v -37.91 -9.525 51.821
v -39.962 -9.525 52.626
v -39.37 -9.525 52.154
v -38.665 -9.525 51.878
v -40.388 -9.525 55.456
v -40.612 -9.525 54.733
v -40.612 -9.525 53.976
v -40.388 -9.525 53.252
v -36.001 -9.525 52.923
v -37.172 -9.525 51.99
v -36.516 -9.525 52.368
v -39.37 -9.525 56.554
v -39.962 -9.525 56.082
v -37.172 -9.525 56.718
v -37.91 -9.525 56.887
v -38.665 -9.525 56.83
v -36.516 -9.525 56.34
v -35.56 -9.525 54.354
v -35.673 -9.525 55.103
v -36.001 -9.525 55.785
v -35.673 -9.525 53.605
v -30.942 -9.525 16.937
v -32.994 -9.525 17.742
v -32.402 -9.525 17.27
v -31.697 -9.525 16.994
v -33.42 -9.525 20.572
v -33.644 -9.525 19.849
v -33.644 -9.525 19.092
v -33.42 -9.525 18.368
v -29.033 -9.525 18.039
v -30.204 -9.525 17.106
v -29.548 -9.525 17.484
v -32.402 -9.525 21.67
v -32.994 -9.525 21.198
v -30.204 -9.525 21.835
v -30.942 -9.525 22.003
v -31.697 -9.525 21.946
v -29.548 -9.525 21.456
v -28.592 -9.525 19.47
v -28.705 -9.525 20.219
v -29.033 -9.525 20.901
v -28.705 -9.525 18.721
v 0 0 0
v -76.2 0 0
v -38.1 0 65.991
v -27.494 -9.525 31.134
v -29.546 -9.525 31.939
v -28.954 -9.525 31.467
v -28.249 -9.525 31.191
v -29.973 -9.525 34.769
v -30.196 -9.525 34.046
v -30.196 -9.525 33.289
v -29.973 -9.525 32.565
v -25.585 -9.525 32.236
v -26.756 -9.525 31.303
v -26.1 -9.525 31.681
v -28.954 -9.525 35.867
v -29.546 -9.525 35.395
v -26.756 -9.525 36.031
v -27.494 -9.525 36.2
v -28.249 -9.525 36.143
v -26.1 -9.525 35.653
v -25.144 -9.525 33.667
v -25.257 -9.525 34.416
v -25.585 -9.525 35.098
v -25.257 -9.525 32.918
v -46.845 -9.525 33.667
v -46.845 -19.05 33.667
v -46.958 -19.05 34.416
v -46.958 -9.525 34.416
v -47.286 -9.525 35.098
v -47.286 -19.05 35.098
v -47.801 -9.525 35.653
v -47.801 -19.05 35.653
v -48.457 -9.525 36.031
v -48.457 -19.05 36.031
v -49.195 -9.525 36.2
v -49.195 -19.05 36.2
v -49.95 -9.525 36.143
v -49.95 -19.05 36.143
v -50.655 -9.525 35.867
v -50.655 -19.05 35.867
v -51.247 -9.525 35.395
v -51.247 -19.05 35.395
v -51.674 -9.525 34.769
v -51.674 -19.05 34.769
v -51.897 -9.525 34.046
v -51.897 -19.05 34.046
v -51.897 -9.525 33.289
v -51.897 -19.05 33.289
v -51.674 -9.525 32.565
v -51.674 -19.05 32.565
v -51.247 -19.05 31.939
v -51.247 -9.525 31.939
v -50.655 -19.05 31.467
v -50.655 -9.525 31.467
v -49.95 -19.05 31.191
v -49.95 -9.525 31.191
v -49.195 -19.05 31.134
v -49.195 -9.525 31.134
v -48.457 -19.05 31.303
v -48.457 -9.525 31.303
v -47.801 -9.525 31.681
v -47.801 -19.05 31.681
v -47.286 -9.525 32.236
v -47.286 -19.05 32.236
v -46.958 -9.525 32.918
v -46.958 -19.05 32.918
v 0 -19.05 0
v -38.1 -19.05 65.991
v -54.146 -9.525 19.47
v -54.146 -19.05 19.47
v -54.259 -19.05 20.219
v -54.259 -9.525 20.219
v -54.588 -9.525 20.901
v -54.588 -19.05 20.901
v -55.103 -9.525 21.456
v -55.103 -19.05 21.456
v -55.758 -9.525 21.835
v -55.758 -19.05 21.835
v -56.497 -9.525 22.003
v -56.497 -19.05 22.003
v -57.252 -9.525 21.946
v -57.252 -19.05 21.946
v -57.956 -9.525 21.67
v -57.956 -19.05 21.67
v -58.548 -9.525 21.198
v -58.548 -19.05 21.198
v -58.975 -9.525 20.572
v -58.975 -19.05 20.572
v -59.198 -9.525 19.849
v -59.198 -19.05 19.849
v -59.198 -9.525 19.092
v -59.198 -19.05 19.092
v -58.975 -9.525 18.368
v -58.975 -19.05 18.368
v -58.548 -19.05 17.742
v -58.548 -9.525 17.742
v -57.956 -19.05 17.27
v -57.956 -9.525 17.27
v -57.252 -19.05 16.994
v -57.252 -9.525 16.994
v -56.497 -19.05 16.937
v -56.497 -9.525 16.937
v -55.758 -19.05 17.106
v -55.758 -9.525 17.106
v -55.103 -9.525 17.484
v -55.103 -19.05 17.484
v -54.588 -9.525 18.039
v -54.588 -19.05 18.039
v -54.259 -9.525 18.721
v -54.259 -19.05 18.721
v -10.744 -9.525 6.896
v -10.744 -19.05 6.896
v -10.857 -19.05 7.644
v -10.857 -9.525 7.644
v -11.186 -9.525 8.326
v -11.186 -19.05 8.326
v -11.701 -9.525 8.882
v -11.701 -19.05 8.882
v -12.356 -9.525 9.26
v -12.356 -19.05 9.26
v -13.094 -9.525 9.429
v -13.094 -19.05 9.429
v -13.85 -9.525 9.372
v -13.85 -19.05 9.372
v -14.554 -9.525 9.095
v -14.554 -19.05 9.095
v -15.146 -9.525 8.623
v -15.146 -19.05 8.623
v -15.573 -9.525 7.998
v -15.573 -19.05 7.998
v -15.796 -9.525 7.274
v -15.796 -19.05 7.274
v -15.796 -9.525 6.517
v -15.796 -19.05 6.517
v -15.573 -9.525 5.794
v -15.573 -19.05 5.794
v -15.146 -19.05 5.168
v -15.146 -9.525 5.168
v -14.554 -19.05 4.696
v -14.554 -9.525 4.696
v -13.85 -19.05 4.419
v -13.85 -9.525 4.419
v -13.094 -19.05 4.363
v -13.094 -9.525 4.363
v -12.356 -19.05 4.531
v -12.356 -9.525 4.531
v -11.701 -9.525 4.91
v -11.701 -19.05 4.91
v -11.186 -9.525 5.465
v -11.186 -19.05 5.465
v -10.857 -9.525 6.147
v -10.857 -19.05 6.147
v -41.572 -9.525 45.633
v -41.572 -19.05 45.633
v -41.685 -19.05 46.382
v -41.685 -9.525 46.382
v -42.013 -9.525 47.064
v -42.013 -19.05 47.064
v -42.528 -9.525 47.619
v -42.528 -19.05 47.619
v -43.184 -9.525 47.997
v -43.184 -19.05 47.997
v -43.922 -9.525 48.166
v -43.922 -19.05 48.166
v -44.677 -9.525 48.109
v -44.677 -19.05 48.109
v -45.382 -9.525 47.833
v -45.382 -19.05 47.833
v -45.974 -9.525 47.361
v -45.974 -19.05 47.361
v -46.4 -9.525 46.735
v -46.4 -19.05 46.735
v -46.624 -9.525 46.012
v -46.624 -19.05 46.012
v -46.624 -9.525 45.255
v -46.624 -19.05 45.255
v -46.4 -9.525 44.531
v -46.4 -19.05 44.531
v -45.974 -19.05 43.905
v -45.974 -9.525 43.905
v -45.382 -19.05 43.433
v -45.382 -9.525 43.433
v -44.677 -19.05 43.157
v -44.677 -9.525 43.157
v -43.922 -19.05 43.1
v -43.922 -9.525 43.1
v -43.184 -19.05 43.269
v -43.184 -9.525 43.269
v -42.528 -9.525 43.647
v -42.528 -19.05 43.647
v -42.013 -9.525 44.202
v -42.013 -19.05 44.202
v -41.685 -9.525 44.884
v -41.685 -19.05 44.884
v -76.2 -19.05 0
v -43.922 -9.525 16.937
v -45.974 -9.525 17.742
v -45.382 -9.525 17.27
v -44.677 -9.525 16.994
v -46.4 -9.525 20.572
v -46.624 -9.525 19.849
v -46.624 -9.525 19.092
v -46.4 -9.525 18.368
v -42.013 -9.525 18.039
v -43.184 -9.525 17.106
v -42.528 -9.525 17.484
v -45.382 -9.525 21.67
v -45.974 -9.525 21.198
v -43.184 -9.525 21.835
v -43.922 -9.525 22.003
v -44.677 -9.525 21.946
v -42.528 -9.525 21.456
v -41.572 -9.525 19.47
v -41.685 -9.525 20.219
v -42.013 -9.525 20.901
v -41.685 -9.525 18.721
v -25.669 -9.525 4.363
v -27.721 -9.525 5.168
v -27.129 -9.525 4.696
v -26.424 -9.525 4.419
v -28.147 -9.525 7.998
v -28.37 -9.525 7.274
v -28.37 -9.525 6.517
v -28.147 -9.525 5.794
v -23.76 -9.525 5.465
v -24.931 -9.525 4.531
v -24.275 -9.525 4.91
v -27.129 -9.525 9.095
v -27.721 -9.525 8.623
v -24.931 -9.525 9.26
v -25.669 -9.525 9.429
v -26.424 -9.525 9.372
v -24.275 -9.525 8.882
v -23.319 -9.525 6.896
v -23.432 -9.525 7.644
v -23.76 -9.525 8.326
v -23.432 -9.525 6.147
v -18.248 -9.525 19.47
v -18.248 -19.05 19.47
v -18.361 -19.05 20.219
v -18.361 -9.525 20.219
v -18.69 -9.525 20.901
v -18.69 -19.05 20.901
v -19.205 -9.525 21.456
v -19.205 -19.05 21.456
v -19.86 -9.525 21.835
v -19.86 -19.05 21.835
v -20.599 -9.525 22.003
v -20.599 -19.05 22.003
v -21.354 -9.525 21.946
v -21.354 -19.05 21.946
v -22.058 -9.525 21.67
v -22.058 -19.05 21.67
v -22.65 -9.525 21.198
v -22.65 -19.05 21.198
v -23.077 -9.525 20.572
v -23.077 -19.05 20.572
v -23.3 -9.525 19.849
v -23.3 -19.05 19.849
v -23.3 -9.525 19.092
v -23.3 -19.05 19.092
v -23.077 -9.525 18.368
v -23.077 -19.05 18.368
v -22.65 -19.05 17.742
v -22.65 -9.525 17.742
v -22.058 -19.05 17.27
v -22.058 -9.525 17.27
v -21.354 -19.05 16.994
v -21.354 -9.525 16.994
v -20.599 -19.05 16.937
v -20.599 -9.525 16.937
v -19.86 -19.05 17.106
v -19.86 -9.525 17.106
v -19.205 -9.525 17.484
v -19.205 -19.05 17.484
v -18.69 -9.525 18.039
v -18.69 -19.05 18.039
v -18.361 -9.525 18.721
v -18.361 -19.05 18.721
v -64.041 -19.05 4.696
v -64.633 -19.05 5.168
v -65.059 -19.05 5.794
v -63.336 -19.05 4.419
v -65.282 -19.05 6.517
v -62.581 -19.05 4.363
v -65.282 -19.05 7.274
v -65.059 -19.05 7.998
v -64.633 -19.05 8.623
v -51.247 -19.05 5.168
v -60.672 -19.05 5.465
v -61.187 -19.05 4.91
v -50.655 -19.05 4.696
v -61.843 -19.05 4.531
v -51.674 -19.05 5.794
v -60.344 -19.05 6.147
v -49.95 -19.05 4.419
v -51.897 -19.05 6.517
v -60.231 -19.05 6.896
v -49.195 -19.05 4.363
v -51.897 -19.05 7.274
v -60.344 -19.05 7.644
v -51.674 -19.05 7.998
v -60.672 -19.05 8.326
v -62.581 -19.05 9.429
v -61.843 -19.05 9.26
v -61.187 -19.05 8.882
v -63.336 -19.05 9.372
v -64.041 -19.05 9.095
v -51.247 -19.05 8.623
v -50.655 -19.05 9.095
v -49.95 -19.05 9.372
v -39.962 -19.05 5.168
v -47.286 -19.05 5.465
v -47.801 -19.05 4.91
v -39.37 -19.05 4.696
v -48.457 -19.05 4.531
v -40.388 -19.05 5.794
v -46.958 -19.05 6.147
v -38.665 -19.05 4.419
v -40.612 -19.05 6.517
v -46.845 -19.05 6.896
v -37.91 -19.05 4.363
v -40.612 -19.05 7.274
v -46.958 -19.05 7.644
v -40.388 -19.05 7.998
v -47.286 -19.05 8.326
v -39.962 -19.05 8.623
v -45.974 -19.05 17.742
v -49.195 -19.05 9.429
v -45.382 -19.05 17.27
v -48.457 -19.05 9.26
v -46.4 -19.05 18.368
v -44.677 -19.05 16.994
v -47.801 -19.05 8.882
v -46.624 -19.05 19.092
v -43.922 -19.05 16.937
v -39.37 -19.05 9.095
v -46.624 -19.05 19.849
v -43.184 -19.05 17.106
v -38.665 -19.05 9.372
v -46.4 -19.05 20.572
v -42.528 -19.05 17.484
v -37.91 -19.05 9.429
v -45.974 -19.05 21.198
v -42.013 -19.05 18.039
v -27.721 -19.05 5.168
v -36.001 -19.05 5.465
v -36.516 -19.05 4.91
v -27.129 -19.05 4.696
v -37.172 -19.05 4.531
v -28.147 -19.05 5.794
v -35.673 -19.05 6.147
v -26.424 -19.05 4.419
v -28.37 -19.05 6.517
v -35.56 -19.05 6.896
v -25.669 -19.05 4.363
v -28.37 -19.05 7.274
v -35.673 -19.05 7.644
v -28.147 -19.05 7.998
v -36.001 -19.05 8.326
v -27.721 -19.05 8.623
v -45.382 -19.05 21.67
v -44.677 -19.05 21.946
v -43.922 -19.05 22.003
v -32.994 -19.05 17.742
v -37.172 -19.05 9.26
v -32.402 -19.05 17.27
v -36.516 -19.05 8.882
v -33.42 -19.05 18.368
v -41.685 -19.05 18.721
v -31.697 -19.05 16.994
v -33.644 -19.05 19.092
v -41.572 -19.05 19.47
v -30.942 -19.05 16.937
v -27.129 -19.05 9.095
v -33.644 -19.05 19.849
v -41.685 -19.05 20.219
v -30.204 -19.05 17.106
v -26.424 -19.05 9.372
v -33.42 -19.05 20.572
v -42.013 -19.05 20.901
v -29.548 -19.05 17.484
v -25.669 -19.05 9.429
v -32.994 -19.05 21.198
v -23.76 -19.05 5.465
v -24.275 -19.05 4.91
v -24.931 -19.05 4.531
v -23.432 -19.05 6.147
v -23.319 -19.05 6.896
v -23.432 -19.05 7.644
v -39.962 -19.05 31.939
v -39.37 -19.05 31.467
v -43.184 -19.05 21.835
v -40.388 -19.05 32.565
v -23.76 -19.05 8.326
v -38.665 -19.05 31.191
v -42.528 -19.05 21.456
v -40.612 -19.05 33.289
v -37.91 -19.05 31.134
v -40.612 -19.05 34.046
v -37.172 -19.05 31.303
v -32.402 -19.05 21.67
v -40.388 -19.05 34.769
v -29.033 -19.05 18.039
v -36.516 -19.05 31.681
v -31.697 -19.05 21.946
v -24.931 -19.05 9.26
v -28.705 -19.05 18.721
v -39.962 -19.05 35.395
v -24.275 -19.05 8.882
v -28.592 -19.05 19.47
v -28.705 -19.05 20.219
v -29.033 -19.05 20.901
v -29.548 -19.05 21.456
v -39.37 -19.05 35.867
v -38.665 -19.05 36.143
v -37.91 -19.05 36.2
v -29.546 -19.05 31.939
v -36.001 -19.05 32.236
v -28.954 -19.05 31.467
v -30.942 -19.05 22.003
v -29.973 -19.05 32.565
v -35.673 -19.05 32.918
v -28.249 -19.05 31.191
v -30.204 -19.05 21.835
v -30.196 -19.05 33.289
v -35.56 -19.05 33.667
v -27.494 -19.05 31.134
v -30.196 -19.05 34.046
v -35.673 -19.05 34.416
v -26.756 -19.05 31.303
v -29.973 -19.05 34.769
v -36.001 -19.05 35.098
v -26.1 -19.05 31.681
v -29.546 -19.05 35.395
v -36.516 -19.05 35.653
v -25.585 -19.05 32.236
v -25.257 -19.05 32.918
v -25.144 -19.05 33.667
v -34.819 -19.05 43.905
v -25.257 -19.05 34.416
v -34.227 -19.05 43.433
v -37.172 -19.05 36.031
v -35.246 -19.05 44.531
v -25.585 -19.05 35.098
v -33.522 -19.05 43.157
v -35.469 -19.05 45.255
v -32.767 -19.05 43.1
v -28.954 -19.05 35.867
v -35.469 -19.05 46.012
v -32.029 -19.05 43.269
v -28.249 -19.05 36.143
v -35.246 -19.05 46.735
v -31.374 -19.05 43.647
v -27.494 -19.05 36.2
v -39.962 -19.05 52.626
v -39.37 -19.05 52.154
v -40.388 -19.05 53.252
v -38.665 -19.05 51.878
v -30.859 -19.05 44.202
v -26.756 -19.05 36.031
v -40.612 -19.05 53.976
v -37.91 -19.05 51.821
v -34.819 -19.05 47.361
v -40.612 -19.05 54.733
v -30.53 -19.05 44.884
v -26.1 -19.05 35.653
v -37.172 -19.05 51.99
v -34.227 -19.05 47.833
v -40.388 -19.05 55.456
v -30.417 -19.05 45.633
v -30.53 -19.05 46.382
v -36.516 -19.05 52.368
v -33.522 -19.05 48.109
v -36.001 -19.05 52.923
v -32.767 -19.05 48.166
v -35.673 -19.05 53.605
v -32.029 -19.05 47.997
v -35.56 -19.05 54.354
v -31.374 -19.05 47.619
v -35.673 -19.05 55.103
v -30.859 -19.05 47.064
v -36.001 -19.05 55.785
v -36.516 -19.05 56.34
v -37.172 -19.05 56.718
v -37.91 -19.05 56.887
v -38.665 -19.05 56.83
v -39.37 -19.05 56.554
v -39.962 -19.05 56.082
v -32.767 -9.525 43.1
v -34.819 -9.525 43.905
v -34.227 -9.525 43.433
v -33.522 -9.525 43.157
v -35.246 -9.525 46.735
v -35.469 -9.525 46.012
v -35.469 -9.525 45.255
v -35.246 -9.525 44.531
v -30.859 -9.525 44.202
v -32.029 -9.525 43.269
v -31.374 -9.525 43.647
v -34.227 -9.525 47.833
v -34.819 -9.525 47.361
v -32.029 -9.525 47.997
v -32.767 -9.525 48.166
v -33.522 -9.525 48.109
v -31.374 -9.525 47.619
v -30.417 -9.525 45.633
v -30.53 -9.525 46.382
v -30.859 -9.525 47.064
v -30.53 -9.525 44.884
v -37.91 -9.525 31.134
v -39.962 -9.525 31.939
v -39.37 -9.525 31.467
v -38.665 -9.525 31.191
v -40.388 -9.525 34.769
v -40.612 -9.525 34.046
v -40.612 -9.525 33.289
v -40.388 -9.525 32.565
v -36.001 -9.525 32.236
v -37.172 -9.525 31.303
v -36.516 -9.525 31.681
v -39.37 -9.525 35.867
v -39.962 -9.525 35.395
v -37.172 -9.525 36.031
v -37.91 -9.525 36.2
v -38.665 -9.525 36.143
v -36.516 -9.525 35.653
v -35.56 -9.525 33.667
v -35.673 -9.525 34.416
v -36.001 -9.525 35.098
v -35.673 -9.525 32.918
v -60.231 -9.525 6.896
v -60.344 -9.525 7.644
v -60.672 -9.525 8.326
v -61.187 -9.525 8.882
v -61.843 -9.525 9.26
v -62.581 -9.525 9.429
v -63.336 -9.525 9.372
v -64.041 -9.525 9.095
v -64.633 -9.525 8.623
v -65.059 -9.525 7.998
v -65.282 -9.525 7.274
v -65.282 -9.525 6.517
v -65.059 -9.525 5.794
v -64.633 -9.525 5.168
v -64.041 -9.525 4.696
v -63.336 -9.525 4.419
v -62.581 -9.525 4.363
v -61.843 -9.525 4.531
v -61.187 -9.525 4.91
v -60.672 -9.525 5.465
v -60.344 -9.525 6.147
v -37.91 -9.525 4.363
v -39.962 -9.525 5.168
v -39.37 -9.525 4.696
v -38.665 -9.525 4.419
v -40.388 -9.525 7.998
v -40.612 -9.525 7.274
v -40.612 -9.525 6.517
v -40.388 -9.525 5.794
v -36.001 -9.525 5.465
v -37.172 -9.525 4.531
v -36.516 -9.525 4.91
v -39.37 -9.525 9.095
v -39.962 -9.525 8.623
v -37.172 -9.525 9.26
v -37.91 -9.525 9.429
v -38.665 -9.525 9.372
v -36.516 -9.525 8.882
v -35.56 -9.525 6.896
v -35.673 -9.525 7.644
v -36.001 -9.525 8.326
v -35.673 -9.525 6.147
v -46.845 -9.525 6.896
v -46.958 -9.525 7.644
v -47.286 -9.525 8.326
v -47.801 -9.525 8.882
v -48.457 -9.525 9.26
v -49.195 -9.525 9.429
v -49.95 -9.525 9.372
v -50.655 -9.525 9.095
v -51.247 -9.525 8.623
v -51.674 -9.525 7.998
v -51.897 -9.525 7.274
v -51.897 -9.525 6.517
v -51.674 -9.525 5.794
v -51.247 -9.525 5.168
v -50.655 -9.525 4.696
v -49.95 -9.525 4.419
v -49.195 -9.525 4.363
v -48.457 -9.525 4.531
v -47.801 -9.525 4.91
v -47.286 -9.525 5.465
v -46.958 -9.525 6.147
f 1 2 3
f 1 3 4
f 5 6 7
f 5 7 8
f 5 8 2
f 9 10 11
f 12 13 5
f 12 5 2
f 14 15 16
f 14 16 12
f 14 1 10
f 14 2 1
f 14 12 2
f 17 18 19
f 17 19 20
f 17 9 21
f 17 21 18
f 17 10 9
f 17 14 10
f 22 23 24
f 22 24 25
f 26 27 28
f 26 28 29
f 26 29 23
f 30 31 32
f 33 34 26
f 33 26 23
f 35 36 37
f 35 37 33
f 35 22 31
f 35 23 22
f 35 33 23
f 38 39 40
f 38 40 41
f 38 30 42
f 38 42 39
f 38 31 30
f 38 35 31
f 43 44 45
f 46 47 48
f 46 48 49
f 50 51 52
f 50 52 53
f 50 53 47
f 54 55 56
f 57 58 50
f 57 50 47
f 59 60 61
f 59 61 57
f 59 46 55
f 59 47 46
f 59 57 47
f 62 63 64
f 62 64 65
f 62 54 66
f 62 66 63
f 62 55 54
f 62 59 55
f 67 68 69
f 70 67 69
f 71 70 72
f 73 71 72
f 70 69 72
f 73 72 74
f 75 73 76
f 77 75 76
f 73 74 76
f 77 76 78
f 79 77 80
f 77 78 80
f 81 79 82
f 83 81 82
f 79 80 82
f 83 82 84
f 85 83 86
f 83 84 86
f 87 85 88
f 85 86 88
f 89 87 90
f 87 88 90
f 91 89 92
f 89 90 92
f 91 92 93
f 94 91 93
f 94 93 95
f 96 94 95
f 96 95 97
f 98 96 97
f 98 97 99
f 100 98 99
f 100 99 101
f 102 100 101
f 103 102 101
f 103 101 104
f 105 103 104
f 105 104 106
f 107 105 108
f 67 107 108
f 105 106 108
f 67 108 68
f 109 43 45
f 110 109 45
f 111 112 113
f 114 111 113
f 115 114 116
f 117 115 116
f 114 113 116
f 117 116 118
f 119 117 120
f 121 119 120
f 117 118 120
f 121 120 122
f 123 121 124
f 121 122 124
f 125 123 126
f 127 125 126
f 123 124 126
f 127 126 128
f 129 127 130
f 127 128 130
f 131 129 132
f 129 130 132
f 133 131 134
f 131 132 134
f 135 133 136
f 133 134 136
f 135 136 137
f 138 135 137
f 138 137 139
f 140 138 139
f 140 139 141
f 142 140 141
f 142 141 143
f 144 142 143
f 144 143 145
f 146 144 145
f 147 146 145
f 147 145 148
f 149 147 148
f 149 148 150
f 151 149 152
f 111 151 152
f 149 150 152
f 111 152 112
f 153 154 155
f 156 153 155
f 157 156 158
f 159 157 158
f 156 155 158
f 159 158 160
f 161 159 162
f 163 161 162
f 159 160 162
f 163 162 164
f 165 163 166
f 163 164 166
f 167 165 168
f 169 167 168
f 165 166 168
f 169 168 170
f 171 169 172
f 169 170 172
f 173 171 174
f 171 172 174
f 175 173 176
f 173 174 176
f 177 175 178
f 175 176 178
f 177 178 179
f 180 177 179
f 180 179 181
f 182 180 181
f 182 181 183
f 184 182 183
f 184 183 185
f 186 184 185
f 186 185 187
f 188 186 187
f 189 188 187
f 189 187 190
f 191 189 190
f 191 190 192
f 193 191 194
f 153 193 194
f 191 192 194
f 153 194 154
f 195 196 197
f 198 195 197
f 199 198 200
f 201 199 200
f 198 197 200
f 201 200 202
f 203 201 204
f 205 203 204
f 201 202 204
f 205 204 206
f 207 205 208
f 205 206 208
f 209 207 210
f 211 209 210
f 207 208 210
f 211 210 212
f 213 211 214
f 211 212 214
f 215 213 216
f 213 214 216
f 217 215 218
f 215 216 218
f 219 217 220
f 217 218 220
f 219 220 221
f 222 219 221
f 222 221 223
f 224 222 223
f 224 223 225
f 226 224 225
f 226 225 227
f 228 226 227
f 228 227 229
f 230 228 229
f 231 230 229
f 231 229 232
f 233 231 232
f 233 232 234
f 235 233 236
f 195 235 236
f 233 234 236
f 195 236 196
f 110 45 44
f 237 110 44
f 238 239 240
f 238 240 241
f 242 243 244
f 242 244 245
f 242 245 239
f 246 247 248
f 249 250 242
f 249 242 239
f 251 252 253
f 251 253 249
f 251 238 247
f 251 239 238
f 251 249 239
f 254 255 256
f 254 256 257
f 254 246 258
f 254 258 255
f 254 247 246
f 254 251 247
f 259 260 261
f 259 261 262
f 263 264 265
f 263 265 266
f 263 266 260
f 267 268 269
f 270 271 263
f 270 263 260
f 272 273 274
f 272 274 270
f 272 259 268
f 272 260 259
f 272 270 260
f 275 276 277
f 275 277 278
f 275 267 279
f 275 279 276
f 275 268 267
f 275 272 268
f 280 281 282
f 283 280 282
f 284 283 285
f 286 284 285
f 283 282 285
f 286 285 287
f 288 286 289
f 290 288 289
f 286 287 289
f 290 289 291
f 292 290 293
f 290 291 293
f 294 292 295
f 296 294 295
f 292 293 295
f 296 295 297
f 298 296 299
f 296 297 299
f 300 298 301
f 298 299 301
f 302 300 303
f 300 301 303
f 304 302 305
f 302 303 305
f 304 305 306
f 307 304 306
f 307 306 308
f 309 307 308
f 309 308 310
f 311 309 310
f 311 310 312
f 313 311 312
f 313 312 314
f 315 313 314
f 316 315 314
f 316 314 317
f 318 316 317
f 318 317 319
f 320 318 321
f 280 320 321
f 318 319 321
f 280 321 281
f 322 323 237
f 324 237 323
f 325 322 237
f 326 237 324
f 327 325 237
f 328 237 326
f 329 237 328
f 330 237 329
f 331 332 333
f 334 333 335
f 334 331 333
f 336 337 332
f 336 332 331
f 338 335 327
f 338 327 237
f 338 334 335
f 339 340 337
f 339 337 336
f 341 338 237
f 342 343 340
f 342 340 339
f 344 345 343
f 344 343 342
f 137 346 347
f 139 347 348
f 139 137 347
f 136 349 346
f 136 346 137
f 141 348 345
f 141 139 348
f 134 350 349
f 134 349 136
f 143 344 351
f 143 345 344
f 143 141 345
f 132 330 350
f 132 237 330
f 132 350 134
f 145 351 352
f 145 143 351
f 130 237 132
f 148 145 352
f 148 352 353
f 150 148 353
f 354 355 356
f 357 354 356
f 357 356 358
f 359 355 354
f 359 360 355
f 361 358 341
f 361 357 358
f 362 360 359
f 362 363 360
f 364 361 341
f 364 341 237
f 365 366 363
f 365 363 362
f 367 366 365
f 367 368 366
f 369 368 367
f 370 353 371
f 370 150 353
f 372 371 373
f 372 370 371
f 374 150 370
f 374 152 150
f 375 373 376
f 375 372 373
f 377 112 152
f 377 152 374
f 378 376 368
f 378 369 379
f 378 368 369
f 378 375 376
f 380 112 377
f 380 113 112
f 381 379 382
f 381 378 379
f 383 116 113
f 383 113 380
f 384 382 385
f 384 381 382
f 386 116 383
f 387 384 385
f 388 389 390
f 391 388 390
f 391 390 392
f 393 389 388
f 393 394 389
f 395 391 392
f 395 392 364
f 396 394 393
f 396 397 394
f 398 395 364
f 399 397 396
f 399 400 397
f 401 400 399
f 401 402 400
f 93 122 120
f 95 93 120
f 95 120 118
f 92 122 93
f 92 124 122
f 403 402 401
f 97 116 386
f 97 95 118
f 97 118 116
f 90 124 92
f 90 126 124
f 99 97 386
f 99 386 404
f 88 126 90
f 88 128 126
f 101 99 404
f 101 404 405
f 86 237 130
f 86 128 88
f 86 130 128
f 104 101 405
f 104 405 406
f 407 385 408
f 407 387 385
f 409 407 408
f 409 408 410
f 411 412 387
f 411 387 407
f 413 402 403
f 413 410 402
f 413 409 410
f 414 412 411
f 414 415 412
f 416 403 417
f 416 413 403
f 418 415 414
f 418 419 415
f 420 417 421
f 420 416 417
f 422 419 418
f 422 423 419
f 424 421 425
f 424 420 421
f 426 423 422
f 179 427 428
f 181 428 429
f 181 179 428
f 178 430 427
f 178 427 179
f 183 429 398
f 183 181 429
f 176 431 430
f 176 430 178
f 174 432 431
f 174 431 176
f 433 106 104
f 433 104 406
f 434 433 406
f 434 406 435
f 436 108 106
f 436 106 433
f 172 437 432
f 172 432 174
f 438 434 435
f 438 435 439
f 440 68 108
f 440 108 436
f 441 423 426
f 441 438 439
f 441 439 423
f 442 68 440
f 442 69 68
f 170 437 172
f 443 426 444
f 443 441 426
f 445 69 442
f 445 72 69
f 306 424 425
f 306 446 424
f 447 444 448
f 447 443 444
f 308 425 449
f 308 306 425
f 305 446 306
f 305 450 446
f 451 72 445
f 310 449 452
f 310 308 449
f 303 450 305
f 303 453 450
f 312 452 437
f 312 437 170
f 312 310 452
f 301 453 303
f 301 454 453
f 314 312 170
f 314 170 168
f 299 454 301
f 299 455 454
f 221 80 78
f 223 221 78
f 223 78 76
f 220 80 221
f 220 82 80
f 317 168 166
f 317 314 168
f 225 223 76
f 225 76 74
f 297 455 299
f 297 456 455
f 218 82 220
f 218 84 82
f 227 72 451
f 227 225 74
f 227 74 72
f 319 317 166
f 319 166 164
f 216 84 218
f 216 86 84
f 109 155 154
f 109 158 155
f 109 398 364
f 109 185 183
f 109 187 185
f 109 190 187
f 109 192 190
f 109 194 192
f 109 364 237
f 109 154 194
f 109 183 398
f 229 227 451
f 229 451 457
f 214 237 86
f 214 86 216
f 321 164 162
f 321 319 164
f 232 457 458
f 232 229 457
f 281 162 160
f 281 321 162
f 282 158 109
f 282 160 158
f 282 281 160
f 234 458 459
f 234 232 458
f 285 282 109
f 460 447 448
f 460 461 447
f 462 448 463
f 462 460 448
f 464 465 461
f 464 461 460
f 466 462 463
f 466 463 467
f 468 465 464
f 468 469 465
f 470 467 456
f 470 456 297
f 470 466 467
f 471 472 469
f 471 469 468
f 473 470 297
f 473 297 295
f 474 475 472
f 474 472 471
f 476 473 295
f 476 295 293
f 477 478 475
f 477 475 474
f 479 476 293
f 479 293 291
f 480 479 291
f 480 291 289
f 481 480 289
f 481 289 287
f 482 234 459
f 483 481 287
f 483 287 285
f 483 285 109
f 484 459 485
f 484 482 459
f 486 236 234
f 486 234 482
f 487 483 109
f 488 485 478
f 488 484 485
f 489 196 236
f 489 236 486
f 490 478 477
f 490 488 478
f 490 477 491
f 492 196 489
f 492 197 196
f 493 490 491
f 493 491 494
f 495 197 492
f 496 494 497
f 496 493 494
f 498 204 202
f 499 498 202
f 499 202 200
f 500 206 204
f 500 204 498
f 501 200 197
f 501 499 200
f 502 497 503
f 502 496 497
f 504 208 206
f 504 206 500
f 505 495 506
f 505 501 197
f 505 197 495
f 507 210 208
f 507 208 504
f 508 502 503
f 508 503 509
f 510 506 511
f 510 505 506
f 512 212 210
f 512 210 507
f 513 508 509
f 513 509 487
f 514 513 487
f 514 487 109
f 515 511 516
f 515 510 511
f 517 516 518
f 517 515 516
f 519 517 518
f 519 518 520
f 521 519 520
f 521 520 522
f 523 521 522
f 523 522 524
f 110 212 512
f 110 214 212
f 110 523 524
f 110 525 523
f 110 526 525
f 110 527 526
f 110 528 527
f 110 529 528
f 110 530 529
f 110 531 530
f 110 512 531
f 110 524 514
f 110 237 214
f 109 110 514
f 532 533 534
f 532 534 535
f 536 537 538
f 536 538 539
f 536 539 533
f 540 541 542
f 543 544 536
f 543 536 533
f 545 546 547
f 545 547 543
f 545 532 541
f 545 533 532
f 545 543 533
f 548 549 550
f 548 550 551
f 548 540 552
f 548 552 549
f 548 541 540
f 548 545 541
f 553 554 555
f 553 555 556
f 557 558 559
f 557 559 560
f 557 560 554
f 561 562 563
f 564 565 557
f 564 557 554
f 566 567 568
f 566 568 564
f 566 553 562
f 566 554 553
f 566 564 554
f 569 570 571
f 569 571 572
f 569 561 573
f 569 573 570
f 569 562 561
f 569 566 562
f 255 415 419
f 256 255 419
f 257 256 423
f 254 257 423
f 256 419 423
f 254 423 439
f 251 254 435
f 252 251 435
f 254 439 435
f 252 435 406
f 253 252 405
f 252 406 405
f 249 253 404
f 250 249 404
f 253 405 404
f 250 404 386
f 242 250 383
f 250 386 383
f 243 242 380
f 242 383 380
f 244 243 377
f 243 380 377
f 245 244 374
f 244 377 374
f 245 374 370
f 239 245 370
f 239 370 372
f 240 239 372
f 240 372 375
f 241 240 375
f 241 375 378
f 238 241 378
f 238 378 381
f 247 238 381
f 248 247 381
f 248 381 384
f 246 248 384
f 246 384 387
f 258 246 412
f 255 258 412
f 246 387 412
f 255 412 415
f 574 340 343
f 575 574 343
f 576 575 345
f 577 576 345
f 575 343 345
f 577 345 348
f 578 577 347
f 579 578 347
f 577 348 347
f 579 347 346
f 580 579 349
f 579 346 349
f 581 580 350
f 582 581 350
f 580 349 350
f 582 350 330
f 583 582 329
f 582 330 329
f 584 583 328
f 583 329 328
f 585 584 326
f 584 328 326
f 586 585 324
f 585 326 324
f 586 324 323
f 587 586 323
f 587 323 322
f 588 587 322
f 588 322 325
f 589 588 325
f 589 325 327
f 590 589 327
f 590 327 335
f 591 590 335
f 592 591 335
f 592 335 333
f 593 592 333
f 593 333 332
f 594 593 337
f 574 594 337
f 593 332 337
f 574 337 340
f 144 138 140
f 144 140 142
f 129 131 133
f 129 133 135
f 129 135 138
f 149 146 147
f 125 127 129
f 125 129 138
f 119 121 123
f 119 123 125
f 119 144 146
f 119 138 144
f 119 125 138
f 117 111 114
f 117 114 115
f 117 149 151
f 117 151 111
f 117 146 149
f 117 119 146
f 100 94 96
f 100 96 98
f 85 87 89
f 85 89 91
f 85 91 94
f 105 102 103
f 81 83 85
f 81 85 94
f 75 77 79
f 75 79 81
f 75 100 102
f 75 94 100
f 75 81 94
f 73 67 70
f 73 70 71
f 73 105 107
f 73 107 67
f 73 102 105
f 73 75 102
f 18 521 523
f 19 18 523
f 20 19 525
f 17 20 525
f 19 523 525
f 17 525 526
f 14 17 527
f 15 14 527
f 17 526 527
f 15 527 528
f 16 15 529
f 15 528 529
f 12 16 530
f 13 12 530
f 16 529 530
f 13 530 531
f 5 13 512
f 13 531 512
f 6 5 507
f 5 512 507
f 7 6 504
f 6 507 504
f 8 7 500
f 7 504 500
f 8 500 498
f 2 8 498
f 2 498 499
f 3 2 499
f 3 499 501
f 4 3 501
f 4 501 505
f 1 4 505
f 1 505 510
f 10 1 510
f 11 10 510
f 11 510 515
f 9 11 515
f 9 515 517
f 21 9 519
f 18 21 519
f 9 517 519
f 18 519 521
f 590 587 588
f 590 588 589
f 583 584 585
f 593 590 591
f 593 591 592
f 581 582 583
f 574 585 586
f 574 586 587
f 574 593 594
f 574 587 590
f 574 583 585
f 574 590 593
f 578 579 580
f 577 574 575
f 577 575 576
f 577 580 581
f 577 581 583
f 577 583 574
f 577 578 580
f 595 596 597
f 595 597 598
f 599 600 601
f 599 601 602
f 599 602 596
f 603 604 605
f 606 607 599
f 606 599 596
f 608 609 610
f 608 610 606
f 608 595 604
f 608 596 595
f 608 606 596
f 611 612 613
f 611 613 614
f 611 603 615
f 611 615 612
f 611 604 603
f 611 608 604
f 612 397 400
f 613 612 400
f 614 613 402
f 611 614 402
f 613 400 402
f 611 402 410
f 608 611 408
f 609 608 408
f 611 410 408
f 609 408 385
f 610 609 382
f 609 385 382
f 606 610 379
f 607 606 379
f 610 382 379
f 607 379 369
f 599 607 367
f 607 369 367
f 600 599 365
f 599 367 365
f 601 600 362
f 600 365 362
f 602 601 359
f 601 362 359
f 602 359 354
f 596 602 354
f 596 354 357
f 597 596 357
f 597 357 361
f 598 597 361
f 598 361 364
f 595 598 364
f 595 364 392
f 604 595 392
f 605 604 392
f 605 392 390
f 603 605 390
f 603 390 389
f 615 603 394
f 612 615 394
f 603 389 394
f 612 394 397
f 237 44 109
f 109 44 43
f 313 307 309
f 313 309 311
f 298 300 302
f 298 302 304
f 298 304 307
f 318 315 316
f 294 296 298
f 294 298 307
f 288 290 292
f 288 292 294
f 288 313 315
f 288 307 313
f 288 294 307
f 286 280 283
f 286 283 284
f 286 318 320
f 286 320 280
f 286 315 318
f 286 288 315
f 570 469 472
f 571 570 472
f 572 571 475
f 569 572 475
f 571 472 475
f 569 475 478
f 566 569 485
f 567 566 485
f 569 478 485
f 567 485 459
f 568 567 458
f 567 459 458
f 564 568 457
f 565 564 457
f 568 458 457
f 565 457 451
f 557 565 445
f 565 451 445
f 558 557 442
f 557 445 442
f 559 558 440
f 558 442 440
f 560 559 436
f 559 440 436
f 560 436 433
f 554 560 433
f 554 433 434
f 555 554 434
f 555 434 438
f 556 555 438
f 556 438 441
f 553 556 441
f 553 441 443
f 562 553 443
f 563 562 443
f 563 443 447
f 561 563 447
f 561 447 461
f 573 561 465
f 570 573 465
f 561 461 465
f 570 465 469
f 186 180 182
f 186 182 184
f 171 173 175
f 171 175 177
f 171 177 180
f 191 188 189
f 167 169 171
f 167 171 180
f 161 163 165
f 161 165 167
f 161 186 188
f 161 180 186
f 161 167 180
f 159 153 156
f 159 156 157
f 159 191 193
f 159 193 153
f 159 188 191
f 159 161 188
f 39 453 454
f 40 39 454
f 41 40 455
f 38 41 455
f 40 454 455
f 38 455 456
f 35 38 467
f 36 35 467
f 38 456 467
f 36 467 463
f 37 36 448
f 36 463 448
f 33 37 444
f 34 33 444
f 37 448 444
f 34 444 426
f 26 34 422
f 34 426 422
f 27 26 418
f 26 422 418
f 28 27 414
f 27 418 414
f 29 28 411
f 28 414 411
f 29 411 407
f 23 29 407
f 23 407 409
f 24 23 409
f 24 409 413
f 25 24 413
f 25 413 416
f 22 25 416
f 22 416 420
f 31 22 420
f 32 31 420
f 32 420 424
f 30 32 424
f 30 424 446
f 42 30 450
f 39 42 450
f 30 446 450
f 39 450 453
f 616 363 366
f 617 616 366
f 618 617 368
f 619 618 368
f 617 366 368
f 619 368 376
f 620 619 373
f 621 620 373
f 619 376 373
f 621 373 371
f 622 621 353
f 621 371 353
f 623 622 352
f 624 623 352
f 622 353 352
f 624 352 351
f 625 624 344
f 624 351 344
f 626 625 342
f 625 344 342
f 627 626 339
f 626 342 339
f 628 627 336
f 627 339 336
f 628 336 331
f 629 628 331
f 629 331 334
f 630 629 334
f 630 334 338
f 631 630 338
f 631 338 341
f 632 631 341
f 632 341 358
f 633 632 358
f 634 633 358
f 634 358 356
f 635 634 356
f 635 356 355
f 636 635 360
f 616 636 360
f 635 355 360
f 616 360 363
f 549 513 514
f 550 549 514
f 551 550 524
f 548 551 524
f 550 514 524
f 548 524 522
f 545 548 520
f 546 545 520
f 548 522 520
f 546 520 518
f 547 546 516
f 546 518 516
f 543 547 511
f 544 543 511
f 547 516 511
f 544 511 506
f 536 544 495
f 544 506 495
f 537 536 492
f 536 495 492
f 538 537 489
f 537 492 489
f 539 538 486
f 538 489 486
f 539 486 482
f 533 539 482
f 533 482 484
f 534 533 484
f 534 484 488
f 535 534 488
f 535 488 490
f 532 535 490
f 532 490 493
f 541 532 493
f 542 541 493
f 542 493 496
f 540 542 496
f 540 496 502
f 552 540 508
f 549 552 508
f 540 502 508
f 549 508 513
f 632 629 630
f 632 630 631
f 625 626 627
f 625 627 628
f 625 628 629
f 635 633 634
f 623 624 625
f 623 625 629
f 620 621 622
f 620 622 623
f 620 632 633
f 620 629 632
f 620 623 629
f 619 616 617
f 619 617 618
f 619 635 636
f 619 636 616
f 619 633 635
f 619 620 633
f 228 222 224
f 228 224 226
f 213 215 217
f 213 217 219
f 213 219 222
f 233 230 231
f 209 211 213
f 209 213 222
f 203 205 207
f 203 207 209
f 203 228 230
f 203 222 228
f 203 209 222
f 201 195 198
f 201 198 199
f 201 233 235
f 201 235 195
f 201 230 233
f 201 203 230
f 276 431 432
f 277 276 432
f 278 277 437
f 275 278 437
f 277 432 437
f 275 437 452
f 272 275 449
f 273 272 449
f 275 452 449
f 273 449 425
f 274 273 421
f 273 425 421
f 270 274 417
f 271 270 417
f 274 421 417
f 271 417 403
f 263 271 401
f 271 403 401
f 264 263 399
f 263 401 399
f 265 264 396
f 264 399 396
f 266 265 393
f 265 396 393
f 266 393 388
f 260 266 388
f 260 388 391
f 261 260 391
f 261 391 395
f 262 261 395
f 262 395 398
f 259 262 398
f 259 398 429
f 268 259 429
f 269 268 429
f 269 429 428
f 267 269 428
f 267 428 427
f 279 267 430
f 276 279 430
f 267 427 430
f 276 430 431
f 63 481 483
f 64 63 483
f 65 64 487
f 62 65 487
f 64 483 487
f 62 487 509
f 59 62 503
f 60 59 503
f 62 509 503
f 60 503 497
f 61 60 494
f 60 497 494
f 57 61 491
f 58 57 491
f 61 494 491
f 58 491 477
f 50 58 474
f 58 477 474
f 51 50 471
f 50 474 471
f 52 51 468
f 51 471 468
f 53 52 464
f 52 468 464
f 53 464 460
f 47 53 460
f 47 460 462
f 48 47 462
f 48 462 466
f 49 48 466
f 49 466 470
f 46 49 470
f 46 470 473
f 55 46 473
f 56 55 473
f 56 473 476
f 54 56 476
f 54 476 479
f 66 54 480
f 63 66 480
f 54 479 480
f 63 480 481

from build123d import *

# Parameters (mm, degrees)
F1_DEPTH = 19.05
F2_R     = 2.54
F3_DEPTH = 9.525
F4_DEPTH = 9.525


with BuildPart() as f1:
    # F0 (on Front) → F1 (new body)
    with BuildSketch(Plane.XZ):
        Polygon((-38.1, 65.991136), (-76.2, 0), (0, 0), align=None)
    extrude(amount=F1_DEPTH)

    # F2 (on face) → F3 (cut)
    with BuildSketch(Plane.XZ.offset(19.05)):
        with Locations((-62.770836, 6.895666)):
            Circle(F2_R)
    extrude(amount=-F3_DEPTH, mode=Mode.SUBTRACT)

    # F2 (on face) → F4 (cut)
    with BuildSketch(Plane.XZ.offset(19.05)):
        with Locations((-38.1, 6.895666)):
            Circle(F2_R)
        with Locations((-62.770836, 6.895666)):
            Circle(F2_R)
        with Locations((-49.385134, 6.895666)):
            Circle(F2_R)
        with Locations((-25.858745, 6.895666)):
            Circle(F2_R)
        with Locations((-13.284297, 6.895666)):
            Circle(F2_R)
        with Locations((-56.686427, 19.470114)):
            Circle(F2_R)
        with Locations((-44.111978, 19.470114)):
            Circle(F2_R)
        with Locations((-31.131901, 19.470114)):
            Circle(F2_R)
        with Locations((-20.788403, 19.470114)):
            Circle(F2_R)
        with Locations((-38.1, 33.667073)):
            Circle(F2_R)
        with Locations((-49.385134, 33.667073)):
            Circle(F2_R)
        with Locations((-27.684068, 33.667073)):
            Circle(F2_R)
        with Locations((-44.111978, 45.633078)):
            Circle(F2_R)
        with Locations((-38.1, 54.354072)):
            Circle(F2_R)
        with Locations((-32.957226, 45.633078)):
            Circle(F2_R)
    extrude(amount=-F4_DEPTH, mode=Mode.SUBTRACT)


solid = f1.part
